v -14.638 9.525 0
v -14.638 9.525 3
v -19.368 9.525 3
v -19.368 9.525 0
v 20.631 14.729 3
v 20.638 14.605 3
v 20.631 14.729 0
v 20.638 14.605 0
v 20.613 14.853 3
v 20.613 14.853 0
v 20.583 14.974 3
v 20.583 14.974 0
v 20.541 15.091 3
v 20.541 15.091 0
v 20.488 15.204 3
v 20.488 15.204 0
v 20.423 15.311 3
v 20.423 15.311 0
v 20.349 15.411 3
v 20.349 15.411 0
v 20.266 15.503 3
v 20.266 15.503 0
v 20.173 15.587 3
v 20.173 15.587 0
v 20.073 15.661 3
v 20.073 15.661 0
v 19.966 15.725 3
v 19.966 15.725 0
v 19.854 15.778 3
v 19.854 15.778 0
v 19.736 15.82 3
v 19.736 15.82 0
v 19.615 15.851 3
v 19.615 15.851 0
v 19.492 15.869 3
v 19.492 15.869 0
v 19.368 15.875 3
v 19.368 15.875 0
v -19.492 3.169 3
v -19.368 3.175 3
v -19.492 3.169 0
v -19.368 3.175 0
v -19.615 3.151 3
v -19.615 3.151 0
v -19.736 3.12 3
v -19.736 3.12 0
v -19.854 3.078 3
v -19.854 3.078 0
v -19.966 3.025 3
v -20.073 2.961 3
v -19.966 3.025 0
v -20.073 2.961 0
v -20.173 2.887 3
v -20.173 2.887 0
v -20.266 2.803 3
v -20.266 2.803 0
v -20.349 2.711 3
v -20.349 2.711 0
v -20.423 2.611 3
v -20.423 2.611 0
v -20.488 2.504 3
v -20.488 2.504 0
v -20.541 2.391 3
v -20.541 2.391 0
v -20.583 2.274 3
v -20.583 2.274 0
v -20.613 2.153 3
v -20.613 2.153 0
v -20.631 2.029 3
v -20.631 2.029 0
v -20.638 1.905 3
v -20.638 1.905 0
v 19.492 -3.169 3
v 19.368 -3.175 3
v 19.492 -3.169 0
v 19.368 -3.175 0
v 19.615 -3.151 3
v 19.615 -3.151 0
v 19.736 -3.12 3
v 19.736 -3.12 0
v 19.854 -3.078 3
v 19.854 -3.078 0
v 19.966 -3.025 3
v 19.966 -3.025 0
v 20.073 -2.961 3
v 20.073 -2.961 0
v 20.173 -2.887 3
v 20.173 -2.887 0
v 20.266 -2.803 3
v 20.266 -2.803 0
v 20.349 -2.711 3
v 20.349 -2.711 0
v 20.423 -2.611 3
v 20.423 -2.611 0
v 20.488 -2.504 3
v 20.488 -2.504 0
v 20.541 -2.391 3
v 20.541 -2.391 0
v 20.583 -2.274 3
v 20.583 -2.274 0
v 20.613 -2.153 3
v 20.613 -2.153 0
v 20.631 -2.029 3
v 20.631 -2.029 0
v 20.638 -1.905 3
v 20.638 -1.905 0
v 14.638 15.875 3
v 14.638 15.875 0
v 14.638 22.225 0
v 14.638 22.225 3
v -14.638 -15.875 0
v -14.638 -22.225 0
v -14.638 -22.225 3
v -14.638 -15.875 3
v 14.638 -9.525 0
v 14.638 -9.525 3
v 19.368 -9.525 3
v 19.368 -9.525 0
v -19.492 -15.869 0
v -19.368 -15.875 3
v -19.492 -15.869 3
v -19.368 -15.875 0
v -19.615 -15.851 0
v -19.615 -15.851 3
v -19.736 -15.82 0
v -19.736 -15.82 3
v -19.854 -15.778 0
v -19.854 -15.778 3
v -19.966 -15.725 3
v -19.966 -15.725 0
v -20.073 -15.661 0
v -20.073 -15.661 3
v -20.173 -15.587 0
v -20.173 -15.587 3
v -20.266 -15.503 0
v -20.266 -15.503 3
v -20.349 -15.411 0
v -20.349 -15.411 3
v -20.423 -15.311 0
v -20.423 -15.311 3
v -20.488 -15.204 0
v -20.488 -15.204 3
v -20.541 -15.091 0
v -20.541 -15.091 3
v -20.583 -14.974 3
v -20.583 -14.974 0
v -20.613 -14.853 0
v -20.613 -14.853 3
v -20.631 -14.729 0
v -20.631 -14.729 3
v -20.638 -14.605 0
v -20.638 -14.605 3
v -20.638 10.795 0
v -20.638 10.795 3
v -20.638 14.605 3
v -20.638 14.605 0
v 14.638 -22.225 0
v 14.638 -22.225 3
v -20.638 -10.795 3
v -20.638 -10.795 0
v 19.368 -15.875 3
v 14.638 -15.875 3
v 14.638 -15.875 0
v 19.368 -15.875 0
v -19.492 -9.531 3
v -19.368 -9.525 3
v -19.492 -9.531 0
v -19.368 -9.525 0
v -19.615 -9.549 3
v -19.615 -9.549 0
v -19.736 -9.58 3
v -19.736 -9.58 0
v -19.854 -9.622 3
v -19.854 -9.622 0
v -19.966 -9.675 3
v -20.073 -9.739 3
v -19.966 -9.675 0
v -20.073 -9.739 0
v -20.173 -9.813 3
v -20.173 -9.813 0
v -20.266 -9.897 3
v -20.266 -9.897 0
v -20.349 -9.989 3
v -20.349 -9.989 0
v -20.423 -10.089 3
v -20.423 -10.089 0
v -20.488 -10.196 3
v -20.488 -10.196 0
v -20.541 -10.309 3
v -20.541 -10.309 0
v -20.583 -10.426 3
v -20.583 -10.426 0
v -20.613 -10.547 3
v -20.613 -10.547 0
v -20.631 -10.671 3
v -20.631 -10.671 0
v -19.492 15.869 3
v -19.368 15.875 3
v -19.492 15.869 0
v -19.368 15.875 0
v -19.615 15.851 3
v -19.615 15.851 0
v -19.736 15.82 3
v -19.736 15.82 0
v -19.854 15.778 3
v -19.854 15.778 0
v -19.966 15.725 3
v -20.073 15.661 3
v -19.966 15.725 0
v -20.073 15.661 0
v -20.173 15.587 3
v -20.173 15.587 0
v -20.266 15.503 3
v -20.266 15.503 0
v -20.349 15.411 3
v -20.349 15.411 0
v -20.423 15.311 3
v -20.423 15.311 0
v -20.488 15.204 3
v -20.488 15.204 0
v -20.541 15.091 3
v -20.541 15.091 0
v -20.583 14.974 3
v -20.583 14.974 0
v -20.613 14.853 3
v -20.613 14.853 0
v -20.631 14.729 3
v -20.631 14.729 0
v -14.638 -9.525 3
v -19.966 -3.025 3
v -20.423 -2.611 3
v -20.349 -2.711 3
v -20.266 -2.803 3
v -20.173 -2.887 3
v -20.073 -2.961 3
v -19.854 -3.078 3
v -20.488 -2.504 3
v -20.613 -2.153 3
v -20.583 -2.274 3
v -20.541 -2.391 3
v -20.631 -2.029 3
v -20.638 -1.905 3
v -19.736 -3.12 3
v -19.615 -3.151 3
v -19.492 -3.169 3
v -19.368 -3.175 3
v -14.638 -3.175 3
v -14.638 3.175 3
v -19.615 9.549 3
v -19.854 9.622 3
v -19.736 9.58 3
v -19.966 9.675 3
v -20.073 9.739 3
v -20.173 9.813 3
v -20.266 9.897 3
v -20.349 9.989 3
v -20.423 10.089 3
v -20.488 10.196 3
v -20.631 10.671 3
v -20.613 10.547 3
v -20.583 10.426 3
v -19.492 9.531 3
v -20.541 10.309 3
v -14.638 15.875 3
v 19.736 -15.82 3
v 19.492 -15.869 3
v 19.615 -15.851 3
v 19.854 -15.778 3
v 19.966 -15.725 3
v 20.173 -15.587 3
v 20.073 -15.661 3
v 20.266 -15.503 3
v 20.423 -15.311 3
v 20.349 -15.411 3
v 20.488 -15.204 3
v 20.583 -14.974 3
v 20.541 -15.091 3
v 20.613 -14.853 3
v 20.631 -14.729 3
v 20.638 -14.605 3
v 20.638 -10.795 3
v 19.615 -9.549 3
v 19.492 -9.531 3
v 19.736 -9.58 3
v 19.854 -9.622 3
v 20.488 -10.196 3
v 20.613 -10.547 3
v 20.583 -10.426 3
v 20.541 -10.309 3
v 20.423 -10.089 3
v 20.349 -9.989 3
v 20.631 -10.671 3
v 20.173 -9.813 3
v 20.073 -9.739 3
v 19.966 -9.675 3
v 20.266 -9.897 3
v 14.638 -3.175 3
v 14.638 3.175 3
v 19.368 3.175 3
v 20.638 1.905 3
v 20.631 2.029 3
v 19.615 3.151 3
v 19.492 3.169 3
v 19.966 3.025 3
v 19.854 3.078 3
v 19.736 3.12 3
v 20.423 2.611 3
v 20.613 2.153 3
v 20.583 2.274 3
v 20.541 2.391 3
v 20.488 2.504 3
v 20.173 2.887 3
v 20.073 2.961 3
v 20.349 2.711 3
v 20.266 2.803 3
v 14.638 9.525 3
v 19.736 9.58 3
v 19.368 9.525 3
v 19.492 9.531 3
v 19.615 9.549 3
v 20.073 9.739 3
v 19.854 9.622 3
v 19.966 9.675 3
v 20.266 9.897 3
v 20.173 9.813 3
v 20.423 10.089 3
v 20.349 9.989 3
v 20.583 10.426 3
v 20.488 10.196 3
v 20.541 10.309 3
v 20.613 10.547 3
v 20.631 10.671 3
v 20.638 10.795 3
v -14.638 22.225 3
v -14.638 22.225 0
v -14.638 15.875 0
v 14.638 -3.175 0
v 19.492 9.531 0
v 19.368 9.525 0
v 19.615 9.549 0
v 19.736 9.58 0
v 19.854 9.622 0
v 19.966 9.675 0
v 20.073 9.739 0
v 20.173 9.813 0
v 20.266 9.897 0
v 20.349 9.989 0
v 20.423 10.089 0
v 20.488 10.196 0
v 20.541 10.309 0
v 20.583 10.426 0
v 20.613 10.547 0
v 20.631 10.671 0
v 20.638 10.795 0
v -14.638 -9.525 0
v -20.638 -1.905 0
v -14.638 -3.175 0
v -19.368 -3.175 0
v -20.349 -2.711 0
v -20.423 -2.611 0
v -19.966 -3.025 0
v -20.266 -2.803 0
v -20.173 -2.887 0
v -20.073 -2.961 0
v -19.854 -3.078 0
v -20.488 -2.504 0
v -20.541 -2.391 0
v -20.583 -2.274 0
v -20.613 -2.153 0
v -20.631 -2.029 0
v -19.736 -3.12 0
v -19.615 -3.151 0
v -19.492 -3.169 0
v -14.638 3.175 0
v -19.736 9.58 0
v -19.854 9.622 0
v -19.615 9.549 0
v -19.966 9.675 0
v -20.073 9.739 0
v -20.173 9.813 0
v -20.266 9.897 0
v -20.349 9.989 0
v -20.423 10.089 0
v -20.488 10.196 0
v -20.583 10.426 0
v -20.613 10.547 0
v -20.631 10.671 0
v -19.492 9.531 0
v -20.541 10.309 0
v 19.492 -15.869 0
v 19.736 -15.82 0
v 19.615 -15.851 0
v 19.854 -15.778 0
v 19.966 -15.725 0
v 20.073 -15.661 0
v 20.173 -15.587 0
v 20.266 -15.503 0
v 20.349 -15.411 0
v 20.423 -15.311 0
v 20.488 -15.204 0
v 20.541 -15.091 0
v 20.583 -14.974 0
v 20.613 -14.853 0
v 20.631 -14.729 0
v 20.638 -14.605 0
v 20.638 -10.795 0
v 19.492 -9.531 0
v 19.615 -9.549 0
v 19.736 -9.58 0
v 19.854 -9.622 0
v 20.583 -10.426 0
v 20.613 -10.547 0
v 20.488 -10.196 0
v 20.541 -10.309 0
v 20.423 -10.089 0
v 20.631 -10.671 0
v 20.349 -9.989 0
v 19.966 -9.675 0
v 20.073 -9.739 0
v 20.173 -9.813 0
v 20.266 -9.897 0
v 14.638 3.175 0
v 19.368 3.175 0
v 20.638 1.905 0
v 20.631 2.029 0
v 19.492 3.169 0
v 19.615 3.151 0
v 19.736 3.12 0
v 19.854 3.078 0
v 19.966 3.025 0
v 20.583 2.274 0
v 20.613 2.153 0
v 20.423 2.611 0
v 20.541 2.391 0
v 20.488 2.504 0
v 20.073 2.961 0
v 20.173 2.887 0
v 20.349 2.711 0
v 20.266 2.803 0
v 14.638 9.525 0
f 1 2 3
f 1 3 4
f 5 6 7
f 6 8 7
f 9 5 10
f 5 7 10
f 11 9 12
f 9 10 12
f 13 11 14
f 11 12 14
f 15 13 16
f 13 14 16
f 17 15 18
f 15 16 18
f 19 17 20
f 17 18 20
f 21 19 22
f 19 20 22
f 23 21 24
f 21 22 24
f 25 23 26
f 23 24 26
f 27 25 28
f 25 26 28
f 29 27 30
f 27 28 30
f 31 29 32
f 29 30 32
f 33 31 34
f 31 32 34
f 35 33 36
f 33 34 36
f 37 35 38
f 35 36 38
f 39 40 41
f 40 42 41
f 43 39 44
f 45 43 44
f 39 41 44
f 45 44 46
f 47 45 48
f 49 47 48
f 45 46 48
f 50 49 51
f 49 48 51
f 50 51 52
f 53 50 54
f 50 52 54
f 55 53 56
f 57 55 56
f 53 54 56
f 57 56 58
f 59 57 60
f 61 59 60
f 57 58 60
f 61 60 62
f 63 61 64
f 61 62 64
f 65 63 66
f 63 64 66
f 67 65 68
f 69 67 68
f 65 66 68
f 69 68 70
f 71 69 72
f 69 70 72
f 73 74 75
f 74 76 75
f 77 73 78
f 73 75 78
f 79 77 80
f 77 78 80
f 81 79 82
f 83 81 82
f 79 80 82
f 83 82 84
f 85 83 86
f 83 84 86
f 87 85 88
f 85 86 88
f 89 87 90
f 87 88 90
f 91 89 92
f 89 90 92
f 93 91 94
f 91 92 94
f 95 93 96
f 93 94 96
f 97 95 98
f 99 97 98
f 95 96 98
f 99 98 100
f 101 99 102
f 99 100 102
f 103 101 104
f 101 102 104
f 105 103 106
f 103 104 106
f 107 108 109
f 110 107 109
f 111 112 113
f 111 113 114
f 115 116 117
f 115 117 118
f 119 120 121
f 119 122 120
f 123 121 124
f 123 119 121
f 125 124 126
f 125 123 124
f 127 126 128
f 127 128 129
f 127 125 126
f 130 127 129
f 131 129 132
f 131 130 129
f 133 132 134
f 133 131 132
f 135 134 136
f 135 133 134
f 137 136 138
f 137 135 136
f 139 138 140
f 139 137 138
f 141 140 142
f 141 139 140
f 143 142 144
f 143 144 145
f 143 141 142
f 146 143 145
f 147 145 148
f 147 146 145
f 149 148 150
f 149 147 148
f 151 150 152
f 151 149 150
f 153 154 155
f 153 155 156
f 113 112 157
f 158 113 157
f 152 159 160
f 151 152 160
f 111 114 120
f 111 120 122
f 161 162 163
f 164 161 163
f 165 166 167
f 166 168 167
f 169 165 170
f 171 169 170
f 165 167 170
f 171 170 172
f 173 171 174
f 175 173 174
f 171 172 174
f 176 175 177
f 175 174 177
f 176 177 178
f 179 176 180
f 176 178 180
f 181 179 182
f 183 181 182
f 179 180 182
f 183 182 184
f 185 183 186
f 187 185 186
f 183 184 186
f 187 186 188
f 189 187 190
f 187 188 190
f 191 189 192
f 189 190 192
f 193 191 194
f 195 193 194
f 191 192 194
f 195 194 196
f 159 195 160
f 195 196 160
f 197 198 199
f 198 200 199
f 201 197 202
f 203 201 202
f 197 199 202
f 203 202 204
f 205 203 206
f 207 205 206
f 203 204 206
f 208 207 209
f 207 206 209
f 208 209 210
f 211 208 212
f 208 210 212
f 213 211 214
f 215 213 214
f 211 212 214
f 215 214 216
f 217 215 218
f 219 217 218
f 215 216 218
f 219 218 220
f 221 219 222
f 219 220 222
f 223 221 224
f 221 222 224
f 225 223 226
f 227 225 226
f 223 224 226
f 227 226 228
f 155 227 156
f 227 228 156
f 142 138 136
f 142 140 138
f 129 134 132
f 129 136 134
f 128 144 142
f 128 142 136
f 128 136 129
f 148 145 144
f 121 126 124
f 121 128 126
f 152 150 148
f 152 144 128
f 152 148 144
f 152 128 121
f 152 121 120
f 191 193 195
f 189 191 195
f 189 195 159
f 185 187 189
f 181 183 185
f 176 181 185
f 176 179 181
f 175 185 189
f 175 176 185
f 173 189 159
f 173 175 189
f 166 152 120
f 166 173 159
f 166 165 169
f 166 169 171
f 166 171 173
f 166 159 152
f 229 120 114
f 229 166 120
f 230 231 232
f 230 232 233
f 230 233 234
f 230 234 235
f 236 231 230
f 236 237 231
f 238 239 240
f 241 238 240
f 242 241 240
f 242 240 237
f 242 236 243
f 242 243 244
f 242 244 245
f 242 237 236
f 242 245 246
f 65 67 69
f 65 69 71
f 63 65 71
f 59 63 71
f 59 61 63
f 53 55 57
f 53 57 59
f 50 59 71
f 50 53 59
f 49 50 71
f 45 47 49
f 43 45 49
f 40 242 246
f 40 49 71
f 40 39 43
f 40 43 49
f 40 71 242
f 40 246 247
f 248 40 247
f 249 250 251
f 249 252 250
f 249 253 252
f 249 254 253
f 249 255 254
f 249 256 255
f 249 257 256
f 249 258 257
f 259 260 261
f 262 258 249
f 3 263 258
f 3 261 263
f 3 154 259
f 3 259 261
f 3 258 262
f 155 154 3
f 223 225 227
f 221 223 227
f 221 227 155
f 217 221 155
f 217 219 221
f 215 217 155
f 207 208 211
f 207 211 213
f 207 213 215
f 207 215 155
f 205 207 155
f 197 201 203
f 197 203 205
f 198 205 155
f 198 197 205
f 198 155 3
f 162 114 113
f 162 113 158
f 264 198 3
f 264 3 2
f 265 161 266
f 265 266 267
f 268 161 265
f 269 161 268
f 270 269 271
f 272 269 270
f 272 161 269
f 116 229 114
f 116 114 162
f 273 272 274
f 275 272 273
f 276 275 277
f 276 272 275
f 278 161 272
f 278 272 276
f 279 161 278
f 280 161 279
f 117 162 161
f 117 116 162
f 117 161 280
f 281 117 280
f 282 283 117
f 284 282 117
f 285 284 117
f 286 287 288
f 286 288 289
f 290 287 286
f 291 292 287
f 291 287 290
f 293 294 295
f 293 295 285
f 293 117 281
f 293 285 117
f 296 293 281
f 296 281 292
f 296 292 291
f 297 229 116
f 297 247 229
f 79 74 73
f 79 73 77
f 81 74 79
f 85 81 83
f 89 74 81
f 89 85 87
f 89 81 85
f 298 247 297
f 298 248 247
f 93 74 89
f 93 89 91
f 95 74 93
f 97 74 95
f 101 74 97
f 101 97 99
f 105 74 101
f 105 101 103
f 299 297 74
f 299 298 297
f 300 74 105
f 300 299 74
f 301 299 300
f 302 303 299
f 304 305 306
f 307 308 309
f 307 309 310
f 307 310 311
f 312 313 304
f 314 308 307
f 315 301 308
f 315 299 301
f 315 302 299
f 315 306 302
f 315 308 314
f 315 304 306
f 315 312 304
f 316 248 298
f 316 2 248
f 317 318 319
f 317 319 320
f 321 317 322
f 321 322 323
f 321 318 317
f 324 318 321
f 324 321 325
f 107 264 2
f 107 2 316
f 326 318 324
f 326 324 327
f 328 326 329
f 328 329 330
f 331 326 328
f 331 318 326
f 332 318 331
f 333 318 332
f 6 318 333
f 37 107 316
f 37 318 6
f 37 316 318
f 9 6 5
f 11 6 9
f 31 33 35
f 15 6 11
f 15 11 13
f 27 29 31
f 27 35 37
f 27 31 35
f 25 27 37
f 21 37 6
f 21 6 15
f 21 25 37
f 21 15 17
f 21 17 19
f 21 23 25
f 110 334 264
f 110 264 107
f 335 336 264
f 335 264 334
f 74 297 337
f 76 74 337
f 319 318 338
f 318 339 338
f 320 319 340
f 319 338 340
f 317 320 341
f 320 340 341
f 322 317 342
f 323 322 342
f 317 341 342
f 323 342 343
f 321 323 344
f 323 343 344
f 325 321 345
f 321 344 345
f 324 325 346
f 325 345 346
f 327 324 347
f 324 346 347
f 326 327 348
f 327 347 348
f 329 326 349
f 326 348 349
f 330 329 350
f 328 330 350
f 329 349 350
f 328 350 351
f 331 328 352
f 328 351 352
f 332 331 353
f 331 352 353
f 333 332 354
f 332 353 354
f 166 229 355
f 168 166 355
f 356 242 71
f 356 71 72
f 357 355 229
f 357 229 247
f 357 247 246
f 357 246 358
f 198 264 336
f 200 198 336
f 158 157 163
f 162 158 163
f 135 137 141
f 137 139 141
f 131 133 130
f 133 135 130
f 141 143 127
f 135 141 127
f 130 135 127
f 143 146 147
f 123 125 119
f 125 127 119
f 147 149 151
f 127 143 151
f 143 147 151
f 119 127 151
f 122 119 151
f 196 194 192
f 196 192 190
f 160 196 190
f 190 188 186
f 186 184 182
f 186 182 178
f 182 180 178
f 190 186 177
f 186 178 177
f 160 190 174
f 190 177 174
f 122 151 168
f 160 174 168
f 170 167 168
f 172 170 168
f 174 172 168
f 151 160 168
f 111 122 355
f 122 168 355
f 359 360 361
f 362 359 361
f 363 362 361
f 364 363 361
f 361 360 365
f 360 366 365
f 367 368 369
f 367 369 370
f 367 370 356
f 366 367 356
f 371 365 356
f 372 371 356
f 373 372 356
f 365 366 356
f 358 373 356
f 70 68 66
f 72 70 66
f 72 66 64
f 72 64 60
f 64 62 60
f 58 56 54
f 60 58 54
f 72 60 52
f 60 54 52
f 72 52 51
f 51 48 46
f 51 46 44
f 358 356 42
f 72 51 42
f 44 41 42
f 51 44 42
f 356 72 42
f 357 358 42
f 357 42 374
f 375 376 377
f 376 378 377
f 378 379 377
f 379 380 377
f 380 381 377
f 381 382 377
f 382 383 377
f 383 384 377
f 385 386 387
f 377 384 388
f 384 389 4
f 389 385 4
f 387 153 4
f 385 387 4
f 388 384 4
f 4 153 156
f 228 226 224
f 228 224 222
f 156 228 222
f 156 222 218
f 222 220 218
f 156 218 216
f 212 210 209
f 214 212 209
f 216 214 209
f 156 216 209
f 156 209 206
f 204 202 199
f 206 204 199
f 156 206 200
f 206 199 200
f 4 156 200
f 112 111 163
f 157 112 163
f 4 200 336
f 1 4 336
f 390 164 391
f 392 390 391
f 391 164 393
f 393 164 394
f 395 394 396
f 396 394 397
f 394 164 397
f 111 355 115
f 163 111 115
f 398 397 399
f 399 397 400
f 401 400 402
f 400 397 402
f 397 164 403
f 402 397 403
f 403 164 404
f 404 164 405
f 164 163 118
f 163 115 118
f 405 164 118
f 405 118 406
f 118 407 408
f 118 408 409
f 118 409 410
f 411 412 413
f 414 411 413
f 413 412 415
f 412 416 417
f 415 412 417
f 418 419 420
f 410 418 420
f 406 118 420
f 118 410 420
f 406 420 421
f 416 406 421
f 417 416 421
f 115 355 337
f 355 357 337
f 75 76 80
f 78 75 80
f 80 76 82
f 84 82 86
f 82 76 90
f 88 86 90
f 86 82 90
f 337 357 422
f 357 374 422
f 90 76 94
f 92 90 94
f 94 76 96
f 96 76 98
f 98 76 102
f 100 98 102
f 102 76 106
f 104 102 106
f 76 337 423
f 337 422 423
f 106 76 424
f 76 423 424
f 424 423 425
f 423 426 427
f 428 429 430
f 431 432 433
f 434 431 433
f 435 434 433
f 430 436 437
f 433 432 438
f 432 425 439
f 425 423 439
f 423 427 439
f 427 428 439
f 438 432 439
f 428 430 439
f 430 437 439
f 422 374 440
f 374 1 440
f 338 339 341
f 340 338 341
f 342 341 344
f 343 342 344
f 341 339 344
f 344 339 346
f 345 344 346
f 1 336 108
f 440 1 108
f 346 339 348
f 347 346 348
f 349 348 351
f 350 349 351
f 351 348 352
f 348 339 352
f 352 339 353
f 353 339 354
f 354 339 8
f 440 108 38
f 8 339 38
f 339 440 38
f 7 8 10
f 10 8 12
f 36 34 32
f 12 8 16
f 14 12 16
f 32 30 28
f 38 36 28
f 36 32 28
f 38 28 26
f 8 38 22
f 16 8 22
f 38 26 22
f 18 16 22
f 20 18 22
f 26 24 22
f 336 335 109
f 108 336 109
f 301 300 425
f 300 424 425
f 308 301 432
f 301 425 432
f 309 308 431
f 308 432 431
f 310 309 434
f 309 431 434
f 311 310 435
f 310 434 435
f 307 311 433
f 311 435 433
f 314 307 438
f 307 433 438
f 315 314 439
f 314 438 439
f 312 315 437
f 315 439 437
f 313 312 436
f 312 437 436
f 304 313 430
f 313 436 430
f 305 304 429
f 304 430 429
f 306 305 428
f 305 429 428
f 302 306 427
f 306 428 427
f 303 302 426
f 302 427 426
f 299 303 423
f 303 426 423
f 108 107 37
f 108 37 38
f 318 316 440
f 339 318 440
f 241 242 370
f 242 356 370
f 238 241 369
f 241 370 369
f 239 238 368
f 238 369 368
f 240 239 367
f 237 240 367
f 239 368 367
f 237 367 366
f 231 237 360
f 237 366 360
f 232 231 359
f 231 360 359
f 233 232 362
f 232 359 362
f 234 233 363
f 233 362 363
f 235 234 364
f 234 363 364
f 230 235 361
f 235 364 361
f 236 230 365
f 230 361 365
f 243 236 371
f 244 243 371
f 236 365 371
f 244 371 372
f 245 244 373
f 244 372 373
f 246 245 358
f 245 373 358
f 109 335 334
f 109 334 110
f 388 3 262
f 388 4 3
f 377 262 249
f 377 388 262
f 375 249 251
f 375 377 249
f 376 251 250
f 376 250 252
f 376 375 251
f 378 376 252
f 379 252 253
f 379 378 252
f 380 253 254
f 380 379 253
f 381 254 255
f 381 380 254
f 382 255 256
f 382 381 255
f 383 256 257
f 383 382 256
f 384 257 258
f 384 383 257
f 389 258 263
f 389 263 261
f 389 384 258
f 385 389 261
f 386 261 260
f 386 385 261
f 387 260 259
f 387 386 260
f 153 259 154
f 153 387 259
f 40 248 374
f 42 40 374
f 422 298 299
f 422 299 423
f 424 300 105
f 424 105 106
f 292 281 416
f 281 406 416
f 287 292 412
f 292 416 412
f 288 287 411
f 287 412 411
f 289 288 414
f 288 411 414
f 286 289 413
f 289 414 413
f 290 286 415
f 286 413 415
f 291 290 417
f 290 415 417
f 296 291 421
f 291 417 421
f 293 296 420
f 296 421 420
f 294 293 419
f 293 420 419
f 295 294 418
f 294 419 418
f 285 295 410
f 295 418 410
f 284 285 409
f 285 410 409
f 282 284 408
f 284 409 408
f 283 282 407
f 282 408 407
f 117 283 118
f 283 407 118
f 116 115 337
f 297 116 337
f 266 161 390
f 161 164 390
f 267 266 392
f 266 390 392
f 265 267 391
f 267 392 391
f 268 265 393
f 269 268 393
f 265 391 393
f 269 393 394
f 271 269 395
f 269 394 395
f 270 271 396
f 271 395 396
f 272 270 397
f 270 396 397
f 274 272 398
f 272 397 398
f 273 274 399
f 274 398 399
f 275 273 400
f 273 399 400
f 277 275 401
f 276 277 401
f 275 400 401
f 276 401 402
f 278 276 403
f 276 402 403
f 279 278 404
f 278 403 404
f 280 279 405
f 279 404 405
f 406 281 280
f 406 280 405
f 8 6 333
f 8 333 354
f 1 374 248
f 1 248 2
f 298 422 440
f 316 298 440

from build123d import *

# Parameters (mm, degrees)
SKETCH1_W               = 29.275000124
SKETCH1_H               = 44.45
BOSS_EXTRUDE1_DEPTH     = 3
SKETCH2_W               = 3
SKETCH2_H               = 6.35
BOSS_EXTRUDE2_DEPTH     = 6
LPATTERN1_COUNT         = 3
LPATTERN1_PITCH         = 12.7
MIRROR1_COPY_1_SKETCH_W = 3
MIRROR1_COPY_1_SKETCH_H = 6.35
MIRROR1_COPY_1_DEPTH    = 6
MIRROR1_COPY_2_SKETCH_W = 3
MIRROR1_COPY_2_SKETCH_H = 6.35
MIRROR1_COPY_2_DEPTH    = 6
FILLET1_R               = 1.27


with BuildPart() as part:
    # Sketch1 → Boss-Extrude1 (new body)
    with BuildSketch(Plane.XY):
        Rectangle(SKETCH1_W, SKETCH1_H)
    extrude(amount=BOSS_EXTRUDE1_DEPTH)

    # Sketch2 → Boss-Extrude2 (add)
    with BuildSketch(Plane(origin=(14.637500062, 0, 0), x_dir=(0, 0, -1), z_dir=(1, 0, 0))):
        with Locations((-1.5, -12.7)):
            Rectangle(SKETCH2_W, SKETCH2_H)
    boss_extrude2 = extrude(amount=BOSS_EXTRUDE2_DEPTH)

    # LPattern1: Boss-Extrude2 ×3
    with Locations(*[(0, i * LPATTERN1_PITCH, 0) for i in range(1, LPATTERN1_COUNT)]):
        add(boss_extrude2)

    # Mirror1: Boss-Extrude2 across plane
    add(boss_extrude2.mirror(Plane(origin=(0, 0, 0), x_dir=(0, 0, 1), z_dir=(1, 0, 0))))

    # Mirror1 copy 1 sketch → Mirror1 copy 1 (add)
    with BuildSketch(Plane(origin=(-14.637500062, 12.7, 0), x_dir=(0, 0, -1), z_dir=(-1, 0, 0))):
        with Locations((-1.5, 12.7)):
            Rectangle(MIRROR1_COPY_1_SKETCH_W, MIRROR1_COPY_1_SKETCH_H)
    extrude(amount=MIRROR1_COPY_1_DEPTH)

    # Mirror1 copy 2 sketch → Mirror1 copy 2 (add)
    with BuildSketch(Plane(origin=(-14.637500062, 25.4, 0), x_dir=(0, 0, -1), z_dir=(-1, 0, 0))):
        with Locations((-1.5, 12.7)):
            Rectangle(MIRROR1_COPY_2_SKETCH_W, MIRROR1_COPY_2_SKETCH_H)
    extrude(amount=MIRROR1_COPY_2_DEPTH)

    # Fillet1
    fillet1_edges = [part.edges().sort_by_distance(p)[0] for p in [
        (20.637500062, -15.875, 1.5),
        (20.637500062, -9.525, 1.5),
        (20.637500062, -3.175, 1.5),
        (20.637500062, 3.175, 1.5),
        (20.637500062, 9.525, 1.5),
        (20.637500062, 15.875, 1.5),
        (-20.637500062, -9.525, 1.5),
        (-20.637500062, -15.875, 1.5),
        (-20.637500062, 3.175, 1.5),
        (-20.637500062, -3.175, 1.5),
        (-20.637500062, 15.875, 1.5),
        (-20.637500062, 9.525, 1.5),
    ]]
    fillet(fillet1_edges, radius=FILLET1_R)


solid = part.part
